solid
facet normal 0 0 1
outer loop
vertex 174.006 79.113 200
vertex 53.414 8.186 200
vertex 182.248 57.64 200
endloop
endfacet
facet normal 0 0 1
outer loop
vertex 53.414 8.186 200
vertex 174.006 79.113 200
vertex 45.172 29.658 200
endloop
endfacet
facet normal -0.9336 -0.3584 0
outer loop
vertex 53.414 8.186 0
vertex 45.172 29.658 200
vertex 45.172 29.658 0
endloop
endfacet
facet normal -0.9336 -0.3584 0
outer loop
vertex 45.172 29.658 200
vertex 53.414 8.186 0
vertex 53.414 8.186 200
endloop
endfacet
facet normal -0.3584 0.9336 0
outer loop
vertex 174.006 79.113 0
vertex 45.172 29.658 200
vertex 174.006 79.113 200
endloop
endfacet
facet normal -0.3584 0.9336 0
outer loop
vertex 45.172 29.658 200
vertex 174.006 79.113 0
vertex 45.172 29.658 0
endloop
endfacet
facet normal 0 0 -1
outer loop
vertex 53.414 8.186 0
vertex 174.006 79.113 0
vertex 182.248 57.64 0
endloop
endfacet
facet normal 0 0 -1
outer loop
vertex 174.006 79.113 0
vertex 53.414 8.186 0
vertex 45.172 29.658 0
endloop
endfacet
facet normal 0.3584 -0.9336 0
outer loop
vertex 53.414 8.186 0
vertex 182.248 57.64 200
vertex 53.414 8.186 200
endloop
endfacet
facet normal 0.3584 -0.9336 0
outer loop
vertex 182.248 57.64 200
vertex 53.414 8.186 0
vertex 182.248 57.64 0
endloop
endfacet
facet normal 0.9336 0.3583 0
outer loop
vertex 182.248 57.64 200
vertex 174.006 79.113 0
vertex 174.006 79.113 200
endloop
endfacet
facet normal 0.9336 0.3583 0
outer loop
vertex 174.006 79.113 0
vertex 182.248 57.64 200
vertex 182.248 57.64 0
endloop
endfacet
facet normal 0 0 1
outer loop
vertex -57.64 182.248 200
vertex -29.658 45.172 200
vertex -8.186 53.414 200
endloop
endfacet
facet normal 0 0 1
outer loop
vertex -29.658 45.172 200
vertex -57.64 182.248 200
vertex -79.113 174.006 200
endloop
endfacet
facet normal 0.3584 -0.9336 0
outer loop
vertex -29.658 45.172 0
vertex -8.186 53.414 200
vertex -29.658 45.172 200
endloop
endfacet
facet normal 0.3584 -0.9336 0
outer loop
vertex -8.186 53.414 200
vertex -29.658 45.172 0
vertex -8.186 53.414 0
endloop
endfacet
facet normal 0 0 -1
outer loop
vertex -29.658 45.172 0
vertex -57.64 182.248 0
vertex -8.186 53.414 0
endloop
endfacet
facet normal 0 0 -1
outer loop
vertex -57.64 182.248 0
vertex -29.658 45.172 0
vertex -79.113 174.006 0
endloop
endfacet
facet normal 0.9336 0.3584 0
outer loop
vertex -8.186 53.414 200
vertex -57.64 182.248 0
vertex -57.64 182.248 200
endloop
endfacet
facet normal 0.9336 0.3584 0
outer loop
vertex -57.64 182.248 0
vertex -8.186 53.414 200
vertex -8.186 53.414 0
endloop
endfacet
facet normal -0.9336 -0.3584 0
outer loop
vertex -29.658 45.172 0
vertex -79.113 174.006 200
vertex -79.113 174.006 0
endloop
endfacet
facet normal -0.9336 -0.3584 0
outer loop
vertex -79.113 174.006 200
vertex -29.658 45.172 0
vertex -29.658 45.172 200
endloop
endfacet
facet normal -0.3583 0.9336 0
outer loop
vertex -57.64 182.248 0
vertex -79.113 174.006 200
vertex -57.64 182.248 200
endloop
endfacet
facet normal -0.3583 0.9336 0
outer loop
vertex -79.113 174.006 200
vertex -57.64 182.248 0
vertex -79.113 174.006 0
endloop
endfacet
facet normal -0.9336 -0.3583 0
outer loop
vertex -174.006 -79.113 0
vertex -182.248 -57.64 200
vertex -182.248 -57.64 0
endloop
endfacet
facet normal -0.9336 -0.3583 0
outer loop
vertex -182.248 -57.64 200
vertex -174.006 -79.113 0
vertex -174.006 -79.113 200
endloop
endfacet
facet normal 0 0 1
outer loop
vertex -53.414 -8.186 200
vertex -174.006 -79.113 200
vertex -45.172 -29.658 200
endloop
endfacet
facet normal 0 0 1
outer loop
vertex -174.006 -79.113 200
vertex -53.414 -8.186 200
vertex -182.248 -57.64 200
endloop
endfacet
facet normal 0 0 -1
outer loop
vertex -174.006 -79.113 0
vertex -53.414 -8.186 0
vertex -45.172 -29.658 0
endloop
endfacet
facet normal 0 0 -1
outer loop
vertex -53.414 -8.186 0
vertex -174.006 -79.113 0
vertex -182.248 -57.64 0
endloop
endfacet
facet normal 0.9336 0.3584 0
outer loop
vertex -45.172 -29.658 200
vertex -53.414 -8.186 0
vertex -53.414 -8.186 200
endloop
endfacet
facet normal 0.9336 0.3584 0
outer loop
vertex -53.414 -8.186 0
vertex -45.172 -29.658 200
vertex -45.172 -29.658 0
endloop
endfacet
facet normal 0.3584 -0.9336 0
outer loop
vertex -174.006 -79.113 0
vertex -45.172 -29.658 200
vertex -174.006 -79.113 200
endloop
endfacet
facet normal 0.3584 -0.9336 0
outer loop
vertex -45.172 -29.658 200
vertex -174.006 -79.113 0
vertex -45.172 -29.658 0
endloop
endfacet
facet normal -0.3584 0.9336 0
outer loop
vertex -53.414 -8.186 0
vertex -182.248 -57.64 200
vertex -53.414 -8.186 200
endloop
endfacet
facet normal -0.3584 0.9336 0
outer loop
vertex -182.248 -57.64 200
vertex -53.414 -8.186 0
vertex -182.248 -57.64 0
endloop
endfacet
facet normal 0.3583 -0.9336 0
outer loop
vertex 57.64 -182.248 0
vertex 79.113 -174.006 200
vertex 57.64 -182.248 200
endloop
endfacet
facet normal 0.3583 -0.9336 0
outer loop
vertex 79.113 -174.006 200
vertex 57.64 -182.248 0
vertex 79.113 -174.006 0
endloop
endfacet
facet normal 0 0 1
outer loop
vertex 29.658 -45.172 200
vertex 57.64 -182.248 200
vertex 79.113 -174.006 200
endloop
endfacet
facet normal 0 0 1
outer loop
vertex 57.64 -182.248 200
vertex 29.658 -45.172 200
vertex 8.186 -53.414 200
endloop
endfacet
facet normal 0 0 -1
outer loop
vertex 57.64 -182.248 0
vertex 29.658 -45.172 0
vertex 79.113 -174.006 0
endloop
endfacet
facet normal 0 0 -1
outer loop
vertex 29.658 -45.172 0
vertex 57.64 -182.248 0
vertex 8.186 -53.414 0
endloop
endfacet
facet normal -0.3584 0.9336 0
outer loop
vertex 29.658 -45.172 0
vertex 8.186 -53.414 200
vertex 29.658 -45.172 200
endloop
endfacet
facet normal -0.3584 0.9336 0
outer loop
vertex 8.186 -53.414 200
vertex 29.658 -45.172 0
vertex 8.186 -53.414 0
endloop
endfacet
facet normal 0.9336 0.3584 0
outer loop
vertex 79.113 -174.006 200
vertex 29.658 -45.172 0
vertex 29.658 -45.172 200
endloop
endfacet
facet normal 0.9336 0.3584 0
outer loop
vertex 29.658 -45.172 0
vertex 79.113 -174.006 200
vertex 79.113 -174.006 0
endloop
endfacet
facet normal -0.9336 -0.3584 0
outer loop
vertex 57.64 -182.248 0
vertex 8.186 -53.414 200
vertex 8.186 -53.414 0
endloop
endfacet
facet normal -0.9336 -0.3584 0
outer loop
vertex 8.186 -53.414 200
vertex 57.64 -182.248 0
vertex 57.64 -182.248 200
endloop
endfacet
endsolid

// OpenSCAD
// file: config.scad
$fn = 160;

body_height = 1800;
skin_int_dia = 110;

wings_thickness = 3;
wings_nb = 4;
wings_rot_offset = 21;
wings_m = 200;
wings_n = 130;
wings_p = 127;
wings_E = 138;

ring_ext_dia = skin_int_dia - 0.4;
// main file
include <config.scad>;

module wing_box() {
     n = wings_nb;

     for (i = [0:n]) {
          rotate([0, 0, i * 360 / n + wings_rot_offset]) {
               translate([ring_ext_dia/2 - 2, 0, 0]) {
                    translate([0, -wings_thickness/2 - 10, 0]) {
                         cube([wings_E, wings_thickness + 20, 200]);
                    }
               }
          }
     }
}

wing_box();
